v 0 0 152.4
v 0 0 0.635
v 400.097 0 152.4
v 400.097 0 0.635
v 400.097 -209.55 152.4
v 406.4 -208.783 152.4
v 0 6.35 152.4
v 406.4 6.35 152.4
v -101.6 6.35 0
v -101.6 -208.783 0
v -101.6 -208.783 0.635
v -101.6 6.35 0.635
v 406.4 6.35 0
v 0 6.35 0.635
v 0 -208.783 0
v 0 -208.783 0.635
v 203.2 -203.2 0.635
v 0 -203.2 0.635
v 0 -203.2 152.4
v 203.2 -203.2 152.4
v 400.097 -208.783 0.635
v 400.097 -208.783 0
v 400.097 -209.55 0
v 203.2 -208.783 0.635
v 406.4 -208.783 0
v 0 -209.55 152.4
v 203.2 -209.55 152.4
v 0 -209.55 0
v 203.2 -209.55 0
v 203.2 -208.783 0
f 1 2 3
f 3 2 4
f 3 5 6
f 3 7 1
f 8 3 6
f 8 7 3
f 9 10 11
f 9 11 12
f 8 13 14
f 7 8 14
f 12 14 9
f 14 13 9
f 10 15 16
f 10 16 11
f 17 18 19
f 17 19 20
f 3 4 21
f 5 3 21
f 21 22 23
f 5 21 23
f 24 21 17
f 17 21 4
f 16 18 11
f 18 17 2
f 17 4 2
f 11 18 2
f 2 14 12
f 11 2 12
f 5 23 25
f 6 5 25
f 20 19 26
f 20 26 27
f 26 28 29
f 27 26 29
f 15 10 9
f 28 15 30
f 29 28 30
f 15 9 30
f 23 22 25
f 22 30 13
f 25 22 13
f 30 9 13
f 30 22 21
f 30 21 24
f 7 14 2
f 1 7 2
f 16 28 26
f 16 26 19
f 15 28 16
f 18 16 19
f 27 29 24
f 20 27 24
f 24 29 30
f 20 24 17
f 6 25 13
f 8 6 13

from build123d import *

# Parameters (mm, degrees)
BOSS_EXTRUDE1_DEPTH   = 152.4
SKETCH1_W             = 203.2
SKETCH1_H             = 6.35
BOSS_EXTRUDE1_2_DEPTH = 152.4
SKETCH3_W             = 508
SKETCH3_H             = 215.132857965
BOSS_EXTRUDE2_DEPTH   = 0.635


with BuildPart() as part:
    # Sketch1 → Boss-Extrude1 (new body)
    with BuildSketch(Plane.XY):
        Polygon((400.096509451, -209.55), (406.4, -208.782857965), (406.4, 6.35), (0, 6.35), (0, 0), (400.096509451, 0), align=None)
    extrude(amount=BOSS_EXTRUDE1_DEPTH)



with BuildPart() as body_2:
    # Sketch1 → Boss-Extrude1 2 (new body)
    with BuildSketch(Plane.XY):
        with Locations((101.6, -206.375)):
            Rectangle(SKETCH1_W, SKETCH1_H)
    extrude(amount=BOSS_EXTRUDE1_2_DEPTH)


with BuildPart() as part_1:
    add(part.part)

    add(body_2.part)  # Boss-Extrude2 merges body 2
    # Sketch3 → Boss-Extrude2 (add)
    with BuildSketch(Plane(origin=(0, 0, 0), x_dir=(-1, 0, 0), z_dir=(0, 0, -1))):
        with Locations((-152.4, -101.216428983)):
            Rectangle(SKETCH3_W, SKETCH3_H)
    extrude(amount=-BOSS_EXTRUDE2_DEPTH)


solid = part_1.part
